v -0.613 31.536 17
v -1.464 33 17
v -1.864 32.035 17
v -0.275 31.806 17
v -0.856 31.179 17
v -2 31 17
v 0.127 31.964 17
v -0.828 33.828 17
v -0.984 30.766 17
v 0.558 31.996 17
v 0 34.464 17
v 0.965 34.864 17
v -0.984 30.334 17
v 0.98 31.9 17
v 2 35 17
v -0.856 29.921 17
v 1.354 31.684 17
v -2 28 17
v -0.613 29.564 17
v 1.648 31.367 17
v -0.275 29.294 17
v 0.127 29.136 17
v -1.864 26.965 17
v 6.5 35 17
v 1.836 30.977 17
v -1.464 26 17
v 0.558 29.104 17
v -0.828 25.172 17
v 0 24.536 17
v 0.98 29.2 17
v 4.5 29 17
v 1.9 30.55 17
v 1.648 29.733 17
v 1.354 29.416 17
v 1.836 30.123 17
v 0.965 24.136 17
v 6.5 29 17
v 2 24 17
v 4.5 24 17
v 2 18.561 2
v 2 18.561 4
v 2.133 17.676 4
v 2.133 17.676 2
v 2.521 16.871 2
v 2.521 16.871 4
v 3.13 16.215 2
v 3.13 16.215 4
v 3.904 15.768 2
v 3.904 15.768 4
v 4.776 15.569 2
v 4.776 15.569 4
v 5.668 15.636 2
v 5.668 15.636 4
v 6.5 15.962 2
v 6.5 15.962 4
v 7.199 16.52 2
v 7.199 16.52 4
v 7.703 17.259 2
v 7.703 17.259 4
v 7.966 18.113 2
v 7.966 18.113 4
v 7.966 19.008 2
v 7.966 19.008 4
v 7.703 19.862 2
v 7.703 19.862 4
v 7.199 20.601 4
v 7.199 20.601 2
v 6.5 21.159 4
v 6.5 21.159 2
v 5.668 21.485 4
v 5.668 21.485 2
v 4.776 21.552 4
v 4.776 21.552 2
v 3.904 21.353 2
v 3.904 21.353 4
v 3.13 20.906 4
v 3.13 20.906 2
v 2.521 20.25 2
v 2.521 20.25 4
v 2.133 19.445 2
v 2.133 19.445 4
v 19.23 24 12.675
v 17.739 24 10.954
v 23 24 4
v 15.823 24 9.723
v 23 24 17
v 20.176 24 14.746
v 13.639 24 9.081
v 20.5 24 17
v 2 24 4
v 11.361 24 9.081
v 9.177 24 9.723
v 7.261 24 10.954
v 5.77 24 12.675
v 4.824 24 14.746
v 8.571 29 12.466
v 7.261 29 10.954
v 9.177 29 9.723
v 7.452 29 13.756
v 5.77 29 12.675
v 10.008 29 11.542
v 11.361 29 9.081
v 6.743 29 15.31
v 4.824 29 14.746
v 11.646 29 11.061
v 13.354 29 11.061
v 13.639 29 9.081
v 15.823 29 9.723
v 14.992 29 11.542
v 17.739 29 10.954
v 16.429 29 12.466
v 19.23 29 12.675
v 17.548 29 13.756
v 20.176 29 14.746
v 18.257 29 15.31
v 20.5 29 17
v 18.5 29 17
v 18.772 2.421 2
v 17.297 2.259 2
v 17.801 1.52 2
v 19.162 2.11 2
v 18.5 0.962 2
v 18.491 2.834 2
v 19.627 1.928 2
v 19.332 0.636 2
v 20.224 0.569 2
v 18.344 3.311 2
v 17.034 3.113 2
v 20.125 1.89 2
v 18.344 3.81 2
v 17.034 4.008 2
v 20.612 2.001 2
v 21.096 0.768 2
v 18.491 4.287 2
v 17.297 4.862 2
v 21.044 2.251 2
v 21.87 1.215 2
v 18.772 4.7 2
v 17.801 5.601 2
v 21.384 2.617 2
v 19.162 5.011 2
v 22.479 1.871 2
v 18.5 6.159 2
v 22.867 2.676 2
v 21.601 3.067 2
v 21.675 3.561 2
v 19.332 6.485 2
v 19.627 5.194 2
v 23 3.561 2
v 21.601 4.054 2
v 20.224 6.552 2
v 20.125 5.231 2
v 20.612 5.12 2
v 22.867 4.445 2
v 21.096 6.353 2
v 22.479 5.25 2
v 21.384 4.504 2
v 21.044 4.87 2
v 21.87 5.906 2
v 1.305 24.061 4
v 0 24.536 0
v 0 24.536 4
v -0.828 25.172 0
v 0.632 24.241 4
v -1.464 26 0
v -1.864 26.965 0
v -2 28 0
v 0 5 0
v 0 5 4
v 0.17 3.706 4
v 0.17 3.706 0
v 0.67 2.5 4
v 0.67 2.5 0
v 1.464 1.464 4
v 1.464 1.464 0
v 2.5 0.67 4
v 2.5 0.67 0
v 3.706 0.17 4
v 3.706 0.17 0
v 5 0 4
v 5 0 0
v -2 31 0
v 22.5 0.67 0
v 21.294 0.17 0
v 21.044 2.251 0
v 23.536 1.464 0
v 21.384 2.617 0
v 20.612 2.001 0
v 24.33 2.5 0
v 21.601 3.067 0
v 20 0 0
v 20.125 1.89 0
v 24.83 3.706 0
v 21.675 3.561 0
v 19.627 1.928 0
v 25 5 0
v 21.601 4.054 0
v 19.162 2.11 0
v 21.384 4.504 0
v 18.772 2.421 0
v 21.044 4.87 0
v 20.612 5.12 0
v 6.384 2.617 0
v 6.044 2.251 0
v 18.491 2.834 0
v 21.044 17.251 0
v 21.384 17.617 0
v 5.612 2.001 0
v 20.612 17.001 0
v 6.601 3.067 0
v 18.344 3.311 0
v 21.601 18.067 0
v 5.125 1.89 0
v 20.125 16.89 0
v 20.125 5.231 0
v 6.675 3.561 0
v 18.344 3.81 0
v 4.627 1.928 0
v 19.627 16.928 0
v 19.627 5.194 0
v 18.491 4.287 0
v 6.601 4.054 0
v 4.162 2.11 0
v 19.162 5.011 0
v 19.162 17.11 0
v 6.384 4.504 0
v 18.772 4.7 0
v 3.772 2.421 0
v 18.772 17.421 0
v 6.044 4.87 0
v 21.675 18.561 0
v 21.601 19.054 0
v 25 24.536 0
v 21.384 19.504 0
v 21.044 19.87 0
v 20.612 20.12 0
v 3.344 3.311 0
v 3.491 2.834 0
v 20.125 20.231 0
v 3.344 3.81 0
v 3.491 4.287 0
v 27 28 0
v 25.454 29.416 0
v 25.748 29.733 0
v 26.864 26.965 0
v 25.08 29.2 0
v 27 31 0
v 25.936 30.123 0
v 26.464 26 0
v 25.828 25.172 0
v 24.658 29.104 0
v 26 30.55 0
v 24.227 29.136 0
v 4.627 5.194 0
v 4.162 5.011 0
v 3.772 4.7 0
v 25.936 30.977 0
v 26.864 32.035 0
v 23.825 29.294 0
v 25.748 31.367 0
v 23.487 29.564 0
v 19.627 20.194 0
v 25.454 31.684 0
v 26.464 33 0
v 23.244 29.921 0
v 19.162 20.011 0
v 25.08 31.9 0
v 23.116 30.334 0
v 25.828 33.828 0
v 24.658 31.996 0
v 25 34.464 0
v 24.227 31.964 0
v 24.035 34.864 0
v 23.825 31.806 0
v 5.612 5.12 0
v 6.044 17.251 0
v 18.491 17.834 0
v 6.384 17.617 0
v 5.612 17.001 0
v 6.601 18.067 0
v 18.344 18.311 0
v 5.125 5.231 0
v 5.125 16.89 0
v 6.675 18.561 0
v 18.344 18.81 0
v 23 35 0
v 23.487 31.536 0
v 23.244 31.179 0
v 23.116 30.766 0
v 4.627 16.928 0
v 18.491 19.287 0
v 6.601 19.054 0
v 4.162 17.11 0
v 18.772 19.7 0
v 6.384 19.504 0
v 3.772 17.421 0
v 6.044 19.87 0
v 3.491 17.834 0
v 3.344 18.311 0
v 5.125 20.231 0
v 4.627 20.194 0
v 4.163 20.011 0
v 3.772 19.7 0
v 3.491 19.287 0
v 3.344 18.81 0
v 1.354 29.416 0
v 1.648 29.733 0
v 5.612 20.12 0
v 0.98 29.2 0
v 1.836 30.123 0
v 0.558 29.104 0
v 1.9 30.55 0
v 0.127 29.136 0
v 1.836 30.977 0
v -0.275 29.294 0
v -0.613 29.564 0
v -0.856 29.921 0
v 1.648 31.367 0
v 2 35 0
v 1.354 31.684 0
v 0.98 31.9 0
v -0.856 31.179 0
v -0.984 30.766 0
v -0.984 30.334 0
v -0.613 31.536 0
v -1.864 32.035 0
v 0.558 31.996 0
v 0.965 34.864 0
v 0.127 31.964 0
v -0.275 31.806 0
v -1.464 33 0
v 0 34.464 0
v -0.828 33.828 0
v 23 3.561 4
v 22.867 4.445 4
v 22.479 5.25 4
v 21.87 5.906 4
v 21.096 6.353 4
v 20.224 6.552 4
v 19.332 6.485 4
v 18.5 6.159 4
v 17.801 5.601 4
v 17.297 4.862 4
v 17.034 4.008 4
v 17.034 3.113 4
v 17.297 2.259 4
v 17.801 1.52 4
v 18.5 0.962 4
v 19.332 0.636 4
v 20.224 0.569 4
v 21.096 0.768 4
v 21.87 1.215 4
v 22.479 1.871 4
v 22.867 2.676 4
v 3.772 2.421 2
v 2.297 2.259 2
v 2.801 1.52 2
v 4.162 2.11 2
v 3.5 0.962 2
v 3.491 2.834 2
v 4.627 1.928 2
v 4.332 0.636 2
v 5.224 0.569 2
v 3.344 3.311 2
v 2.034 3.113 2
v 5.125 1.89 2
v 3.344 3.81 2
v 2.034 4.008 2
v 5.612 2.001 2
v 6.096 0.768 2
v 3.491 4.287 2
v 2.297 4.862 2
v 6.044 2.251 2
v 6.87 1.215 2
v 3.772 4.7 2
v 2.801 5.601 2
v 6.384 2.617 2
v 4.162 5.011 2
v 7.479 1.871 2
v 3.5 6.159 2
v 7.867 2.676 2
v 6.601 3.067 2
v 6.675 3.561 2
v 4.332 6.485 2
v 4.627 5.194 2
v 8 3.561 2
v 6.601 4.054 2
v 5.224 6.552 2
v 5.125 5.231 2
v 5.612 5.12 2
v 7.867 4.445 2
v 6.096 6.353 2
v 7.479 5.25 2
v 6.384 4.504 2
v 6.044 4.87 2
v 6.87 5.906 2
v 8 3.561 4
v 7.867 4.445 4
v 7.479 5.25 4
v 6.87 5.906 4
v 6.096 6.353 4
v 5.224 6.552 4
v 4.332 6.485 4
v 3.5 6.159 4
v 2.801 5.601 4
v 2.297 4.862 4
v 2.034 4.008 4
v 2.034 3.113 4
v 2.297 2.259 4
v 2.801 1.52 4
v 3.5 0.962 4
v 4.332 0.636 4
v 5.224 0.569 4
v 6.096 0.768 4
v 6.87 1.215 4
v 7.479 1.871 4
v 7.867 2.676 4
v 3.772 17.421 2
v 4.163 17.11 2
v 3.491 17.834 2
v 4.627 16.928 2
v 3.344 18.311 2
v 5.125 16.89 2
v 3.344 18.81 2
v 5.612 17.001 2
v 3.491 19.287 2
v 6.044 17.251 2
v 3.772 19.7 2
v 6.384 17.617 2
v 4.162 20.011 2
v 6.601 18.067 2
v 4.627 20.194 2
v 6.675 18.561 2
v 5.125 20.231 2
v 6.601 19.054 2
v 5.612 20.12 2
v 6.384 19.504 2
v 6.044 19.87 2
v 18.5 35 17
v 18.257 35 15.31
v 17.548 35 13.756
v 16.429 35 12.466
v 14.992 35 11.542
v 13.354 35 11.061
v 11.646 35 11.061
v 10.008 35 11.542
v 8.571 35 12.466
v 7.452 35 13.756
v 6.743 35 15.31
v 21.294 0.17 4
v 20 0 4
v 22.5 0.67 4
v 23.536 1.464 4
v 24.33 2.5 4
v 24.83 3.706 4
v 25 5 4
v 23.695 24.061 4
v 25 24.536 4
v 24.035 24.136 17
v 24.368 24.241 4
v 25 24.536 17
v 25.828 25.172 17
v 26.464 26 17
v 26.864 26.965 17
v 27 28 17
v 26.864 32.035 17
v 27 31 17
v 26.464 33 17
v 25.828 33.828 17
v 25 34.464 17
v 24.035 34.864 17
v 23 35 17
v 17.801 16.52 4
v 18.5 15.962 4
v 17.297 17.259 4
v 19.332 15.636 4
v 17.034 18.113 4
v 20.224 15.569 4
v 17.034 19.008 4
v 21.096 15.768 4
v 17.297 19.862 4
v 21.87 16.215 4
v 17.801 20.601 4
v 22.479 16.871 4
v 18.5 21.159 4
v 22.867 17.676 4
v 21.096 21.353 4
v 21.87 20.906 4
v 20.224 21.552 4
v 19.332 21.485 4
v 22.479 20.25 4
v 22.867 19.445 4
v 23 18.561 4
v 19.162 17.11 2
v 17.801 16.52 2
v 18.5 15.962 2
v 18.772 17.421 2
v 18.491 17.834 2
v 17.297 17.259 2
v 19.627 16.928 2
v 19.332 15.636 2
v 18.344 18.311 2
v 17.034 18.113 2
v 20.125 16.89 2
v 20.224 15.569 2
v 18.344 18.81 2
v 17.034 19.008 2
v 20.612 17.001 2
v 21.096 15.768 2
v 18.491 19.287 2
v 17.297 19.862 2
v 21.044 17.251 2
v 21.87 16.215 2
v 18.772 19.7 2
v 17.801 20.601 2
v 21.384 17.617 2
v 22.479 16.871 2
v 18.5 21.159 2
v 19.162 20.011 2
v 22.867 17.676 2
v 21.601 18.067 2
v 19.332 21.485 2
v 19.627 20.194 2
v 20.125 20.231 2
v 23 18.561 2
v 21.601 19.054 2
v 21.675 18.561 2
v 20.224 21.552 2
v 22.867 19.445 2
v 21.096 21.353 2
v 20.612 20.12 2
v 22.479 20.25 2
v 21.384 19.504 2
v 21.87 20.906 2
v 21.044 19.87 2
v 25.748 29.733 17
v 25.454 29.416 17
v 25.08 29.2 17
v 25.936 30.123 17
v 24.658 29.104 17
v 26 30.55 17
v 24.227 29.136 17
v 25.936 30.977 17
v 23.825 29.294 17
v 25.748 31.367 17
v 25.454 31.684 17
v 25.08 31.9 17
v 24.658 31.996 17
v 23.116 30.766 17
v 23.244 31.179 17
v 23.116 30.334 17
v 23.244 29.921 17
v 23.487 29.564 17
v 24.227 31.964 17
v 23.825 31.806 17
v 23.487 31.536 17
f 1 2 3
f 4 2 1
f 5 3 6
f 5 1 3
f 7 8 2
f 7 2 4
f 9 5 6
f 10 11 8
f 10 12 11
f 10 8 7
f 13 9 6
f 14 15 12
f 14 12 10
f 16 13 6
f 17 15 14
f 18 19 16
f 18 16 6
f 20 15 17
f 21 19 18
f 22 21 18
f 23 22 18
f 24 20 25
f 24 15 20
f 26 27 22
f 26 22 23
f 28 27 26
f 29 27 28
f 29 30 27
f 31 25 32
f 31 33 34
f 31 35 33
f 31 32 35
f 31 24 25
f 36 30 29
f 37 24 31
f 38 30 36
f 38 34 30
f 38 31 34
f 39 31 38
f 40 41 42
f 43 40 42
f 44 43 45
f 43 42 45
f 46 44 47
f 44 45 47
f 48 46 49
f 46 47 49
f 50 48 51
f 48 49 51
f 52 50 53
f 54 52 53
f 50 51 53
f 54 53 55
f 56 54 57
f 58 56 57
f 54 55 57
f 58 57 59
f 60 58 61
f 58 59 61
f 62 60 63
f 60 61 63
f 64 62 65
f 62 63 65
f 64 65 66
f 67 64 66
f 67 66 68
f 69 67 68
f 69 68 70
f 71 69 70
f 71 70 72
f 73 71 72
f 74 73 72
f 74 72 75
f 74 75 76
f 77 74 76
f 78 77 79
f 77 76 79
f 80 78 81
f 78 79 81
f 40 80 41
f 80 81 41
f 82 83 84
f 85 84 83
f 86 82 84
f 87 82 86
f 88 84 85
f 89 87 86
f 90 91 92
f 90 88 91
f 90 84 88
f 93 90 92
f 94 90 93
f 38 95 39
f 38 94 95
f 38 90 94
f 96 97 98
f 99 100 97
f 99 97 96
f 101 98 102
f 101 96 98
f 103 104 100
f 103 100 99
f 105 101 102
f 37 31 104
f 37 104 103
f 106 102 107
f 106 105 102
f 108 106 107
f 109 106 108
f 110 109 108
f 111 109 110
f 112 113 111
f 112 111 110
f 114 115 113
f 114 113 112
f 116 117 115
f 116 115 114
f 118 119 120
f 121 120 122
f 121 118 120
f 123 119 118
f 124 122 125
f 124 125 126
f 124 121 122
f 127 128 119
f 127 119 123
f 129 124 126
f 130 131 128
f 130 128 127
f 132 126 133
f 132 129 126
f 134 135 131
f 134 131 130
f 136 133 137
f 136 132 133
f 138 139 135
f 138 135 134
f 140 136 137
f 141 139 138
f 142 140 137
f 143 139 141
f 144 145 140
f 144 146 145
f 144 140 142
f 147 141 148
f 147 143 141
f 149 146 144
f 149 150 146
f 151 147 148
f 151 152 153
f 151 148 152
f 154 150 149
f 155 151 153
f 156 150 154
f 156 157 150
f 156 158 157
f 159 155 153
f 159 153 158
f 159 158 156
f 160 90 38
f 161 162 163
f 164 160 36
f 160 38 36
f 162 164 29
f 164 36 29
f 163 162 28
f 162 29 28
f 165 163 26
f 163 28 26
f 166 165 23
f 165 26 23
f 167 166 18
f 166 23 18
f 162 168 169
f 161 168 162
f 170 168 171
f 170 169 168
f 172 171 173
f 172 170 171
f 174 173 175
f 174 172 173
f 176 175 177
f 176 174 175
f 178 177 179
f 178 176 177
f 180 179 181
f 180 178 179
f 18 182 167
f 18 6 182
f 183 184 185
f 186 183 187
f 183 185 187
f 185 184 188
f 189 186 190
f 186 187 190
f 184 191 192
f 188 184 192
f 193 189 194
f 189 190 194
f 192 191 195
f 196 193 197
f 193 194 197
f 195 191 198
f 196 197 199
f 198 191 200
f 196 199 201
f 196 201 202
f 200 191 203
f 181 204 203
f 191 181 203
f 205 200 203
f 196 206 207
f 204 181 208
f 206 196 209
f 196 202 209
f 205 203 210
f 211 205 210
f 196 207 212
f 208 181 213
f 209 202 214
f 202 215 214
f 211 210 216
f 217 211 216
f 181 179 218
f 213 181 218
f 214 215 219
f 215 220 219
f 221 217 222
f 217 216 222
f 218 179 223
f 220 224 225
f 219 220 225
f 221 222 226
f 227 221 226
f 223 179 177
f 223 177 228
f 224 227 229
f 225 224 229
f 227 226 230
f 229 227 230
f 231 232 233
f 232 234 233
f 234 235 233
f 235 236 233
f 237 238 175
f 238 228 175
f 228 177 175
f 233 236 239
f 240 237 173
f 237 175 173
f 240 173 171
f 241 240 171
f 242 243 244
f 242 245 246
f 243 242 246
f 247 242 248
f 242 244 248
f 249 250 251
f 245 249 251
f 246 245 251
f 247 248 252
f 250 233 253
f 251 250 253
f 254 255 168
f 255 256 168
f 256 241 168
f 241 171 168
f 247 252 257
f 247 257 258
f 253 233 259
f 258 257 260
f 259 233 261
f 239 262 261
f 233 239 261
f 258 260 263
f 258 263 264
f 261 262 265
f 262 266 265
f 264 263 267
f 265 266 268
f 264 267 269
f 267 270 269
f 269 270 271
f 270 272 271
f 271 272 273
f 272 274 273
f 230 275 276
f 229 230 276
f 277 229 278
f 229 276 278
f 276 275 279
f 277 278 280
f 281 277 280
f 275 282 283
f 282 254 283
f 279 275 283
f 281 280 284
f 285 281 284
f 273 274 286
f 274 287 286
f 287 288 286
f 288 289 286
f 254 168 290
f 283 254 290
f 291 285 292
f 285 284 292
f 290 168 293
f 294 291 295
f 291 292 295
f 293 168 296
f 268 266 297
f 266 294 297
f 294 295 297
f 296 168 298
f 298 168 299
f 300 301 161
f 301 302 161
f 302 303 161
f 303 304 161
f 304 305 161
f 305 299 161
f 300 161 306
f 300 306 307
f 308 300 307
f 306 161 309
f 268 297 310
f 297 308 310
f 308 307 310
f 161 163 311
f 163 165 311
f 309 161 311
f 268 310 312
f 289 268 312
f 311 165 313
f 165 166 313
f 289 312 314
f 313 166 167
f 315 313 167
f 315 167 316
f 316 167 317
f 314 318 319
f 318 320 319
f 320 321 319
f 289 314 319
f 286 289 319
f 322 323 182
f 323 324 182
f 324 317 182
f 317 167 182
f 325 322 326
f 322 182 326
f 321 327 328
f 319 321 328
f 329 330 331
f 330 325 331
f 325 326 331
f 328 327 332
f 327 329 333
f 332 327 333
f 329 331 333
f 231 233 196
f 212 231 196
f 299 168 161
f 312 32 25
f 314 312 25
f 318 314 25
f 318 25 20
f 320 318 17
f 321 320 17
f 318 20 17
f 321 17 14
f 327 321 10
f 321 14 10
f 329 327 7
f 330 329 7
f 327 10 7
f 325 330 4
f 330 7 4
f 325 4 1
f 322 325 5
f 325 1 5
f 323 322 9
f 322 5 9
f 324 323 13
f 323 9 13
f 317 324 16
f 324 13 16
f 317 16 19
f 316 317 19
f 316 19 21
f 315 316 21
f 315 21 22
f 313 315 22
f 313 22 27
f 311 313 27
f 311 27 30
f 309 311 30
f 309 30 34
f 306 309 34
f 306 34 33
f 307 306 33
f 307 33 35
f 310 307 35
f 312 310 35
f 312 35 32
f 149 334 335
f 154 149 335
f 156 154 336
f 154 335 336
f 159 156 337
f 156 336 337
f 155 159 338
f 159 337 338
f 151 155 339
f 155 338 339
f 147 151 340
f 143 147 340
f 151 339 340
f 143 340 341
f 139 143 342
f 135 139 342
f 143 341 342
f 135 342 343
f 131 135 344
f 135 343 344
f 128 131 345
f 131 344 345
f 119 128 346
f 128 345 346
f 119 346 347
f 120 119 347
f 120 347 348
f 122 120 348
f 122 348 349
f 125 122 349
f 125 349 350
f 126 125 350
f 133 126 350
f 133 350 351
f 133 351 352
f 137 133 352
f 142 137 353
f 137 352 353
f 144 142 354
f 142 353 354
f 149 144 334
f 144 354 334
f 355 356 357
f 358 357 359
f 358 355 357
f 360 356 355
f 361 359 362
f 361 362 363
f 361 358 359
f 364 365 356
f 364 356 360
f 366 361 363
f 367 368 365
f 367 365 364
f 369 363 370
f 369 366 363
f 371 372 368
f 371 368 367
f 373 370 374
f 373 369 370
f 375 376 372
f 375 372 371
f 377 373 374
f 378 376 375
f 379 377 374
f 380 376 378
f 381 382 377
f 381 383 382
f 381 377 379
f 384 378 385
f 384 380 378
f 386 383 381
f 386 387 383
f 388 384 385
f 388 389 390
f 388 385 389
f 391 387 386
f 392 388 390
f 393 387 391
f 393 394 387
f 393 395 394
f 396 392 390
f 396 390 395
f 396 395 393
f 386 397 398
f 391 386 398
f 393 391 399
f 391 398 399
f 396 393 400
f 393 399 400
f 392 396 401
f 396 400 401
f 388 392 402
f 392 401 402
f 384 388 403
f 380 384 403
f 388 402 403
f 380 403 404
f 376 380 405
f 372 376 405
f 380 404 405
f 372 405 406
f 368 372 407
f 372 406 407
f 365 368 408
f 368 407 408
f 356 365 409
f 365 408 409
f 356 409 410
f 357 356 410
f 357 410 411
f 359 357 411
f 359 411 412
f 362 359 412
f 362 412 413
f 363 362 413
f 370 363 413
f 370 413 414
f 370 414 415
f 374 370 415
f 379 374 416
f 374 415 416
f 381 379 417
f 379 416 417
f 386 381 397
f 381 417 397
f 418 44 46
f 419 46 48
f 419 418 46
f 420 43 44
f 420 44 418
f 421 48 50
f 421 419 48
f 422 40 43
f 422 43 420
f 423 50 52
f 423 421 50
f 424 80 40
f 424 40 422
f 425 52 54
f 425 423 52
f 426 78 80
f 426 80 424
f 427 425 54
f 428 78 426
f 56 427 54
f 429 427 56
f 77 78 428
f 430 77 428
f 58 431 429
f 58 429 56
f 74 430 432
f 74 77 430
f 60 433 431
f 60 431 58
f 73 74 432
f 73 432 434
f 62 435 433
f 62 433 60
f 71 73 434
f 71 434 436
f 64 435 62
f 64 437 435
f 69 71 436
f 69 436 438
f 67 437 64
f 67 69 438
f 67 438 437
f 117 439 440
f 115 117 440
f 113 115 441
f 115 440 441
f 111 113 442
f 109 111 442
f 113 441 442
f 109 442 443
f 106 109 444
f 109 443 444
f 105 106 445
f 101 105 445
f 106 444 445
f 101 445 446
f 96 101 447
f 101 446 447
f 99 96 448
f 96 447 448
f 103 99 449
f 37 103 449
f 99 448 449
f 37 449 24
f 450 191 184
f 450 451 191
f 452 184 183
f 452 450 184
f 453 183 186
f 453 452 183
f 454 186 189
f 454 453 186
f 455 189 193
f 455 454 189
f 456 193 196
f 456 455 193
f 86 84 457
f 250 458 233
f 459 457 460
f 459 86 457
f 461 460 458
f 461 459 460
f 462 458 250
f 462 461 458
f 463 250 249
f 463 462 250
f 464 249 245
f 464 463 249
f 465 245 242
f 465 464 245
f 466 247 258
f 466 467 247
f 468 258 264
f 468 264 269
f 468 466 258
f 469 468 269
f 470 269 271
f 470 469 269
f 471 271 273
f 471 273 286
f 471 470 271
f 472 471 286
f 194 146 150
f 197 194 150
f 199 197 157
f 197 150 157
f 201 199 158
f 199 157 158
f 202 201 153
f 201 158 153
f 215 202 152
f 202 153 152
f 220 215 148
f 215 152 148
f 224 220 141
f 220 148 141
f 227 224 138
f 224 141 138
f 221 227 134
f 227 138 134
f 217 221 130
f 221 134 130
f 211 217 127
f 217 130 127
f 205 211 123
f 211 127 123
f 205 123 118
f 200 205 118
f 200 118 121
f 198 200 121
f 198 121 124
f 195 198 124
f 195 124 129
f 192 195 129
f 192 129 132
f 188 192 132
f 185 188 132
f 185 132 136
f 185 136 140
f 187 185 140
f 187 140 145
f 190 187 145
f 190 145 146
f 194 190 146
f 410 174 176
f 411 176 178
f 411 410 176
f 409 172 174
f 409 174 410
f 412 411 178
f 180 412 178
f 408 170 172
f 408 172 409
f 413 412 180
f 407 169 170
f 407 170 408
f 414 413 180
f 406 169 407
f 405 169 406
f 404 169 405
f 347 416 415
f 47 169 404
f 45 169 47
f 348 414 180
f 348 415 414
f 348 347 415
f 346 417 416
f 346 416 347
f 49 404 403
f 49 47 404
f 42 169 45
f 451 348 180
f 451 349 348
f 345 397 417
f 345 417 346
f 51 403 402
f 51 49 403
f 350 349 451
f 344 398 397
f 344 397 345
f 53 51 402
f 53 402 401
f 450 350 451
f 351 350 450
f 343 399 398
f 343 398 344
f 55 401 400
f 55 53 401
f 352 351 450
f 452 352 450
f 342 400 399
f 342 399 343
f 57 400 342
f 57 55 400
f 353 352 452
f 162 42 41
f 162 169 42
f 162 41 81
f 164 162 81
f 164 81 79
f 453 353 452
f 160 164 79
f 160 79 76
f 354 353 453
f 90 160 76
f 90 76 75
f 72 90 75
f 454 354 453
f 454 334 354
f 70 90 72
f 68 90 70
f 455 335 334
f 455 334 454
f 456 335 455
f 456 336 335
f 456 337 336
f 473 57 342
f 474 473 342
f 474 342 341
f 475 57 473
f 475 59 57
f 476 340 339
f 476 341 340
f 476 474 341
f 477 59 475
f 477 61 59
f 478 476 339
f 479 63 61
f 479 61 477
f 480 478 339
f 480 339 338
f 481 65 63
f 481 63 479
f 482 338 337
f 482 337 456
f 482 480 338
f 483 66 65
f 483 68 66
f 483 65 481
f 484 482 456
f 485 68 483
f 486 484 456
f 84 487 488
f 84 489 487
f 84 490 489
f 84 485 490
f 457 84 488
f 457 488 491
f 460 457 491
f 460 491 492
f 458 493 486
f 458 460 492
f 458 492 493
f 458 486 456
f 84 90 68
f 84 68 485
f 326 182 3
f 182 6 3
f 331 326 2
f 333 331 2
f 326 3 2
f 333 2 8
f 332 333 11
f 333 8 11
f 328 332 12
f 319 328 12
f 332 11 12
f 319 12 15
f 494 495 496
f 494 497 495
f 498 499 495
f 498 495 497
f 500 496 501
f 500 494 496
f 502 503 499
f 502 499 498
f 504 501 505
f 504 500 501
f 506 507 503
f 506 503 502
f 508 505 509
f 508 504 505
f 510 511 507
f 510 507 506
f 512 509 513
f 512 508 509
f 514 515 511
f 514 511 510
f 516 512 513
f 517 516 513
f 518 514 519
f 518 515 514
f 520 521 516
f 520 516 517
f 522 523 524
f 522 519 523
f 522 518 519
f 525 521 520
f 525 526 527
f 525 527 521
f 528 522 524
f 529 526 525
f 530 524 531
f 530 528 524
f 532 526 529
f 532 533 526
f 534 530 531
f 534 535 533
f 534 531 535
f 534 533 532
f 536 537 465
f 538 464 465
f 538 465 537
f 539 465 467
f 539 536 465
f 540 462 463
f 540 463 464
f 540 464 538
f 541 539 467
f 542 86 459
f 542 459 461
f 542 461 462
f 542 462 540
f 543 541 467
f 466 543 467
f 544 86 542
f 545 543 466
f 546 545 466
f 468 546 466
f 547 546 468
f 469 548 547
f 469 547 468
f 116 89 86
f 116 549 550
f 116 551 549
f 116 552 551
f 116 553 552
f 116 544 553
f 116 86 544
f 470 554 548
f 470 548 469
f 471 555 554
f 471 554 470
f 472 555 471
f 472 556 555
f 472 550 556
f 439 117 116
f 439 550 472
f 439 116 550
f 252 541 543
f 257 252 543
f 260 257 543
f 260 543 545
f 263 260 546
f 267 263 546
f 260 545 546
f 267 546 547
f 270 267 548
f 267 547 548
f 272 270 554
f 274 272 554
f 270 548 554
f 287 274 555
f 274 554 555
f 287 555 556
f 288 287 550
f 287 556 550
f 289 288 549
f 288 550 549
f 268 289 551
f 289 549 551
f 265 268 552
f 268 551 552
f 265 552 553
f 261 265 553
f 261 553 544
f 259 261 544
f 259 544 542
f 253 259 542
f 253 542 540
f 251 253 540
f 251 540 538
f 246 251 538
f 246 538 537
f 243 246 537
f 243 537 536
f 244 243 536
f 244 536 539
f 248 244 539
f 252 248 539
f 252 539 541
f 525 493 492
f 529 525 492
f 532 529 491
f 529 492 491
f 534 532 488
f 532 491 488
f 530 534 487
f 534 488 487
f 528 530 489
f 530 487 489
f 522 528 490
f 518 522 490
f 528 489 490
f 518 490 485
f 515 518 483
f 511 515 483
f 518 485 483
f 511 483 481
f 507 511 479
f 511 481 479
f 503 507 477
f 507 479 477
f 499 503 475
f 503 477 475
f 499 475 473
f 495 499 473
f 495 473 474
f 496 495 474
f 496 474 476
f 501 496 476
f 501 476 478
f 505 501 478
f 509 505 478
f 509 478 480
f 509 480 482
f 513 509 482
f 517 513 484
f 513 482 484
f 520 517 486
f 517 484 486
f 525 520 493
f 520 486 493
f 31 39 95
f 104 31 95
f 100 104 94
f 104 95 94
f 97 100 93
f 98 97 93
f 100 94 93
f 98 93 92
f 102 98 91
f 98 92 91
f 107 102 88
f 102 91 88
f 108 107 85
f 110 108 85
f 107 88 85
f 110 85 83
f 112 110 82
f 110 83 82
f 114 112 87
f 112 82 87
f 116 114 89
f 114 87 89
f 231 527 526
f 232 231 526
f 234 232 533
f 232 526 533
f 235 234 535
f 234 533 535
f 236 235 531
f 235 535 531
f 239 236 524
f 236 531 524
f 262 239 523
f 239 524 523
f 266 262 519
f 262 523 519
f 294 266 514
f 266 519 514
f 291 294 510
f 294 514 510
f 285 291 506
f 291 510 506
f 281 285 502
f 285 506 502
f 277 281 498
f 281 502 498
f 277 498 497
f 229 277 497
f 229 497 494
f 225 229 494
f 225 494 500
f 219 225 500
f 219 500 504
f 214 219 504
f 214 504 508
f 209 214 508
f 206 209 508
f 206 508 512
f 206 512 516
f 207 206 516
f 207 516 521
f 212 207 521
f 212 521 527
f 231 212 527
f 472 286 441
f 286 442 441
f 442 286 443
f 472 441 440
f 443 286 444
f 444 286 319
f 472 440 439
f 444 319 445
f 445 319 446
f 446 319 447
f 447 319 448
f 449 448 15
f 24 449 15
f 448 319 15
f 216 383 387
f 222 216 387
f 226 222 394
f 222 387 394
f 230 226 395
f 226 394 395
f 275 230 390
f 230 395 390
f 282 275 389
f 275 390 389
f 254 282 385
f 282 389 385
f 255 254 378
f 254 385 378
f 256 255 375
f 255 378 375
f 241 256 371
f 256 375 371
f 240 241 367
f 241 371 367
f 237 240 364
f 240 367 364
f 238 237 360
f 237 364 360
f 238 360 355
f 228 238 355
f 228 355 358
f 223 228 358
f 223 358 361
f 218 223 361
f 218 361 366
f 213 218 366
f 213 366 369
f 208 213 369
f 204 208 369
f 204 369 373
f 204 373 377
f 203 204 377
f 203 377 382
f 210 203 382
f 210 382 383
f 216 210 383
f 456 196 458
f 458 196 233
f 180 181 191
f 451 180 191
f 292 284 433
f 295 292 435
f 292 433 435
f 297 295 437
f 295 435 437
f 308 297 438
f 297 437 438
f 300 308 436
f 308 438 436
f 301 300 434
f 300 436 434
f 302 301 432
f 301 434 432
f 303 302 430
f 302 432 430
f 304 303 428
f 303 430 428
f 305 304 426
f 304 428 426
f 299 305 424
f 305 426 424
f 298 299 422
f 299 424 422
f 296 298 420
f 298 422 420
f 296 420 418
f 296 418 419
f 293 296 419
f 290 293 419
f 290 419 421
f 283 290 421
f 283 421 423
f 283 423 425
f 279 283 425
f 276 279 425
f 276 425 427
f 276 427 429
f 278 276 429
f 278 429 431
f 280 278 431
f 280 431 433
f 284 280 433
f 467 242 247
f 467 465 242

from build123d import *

# Parameters (mm, degrees)
F0_W      = 25
F0_H      = 35
F1_DEPTH  = 4
F2_R      = 1.675
F3_DEPTH  = 25
F4_W      = 25
F4_H      = 11
F5_DEPTH  = 13
F7_DEPTH  = 6
F8_R      = 8
F9_DEPTH  = 5
F2_R_2    = 3
F10_DEPTH = 2
F11_R     = 5
F12_W     = 11
F12_H     = 17
F13_DEPTH = 2
F14_W     = 11
F14_H     = 17
F15_DEPTH = 2
F16_R     = 1.45
F17_DEPTH = 25
F18_R     = 4


with BuildPart() as f1:
    # F0 (on Top) → F1 (new body)
    with BuildSketch(Plane.XY):
        with Locations((12.5, 17.5)):
            Rectangle(F0_W, F0_H)
    extrude(amount=F1_DEPTH)

    # F2 (on face) → F3 (cut)
    with BuildSketch(Plane.XY.offset(4)):
        with BuildLine():
            ThreePointArc((3.325, 18.5605346784), (5, 16.8855346784), (6.675, 18.5605346784))
            ThreePointArc((6.675, 18.5605346784), (5, 20.2355346784), (3.325, 18.5605346784))
        make_face()
        with Locations((20, 18.5605346784)):
            Circle(F2_R)
        with Locations((20, 3.5605346784)):
            Circle(F2_R)
        with Locations((5, 3.5605346784)):
            Circle(F2_R)
    extrude(amount=-F3_DEPTH, mode=Mode.SUBTRACT)

    # F4 (on face) → F5 (join)
    with BuildSketch(Plane.XY.offset(4)):
        with Locations((12.5, 29.5)):
            Rectangle(F4_W, F4_H)
    extrude(amount=F5_DEPTH)

    # F6 (on face) → F7 (cut)
    with BuildSketch(Plane(origin=(0, 35, 0), x_dir=(-1, 0, 0), z_dir=(0, 1, 0))):
        with BuildLine():
            ThreePointArc((-18.5, 17), (-12.5, 11), (-6.5, 17))
            Line((-6.5, 17), (-18.5, 17))
        make_face()
    extrude(amount=-F7_DEPTH, mode=Mode.SUBTRACT)

    # F8 (on face) → F9 (cut)
    with BuildSketch(Plane.XZ.offset(-24)):
        with Locations((12.5, 17)):
            Circle(F8_R)
    extrude(amount=-F9_DEPTH, mode=Mode.SUBTRACT)

    # F2 (on face) → F10 (cut)
    with BuildSketch(Plane.XY.offset(4)):
        with BuildLine():
            ThreePointArc((8, 18.5605346784), (5, 21.5605346784), (2, 18.5605346784))
            ThreePointArc((2, 18.5605346784), (5, 15.5605346784), (8, 18.5605346784))
        make_face()
        with BuildLine():
            ThreePointArc((3.325, 18.5605346784), (5, 20.2355346784), (6.675, 18.5605346784))
            ThreePointArc((6.675, 18.5605346784), (5, 16.8855346784), (3.325, 18.5605346784))
        make_face(mode=Mode.SUBTRACT)
        with Locations((20, 18.5605346784)):
            Circle(F2_R_2)
        with Locations((20, 18.5605346784)):
            Circle(F2_R, mode=Mode.SUBTRACT)
        with Locations((20, 3.5605346784)):
            Circle(F2_R_2)
        with Locations((20, 3.5605346784)):
            Circle(F2_R, mode=Mode.SUBTRACT)
        with Locations((5, 3.5605346784)):
            Circle(F2_R_2)
        with Locations((5, 3.5605346784)):
            Circle(F2_R, mode=Mode.SUBTRACT)
    extrude(amount=-F10_DEPTH, mode=Mode.SUBTRACT)

    # F11
    f11_edges = [f1.edges().sort_by_distance(p)[0] for p in [
        (0, 0, 2),
        (25, 0, 2),
    ]]
    fillet(f11_edges, radius=F11_R)

    # F12 (on face) → F13 (join)
    with BuildSketch(Plane(origin=(0, 0, 0), x_dir=(0, -1, 0), z_dir=(-1, 0, 0))):
        with Locations((-29.5, 8.5)):
            Rectangle(F12_W, F12_H)
    extrude(amount=F13_DEPTH)

    # F14 (on face) → F15 (join)
    with BuildSketch(Plane.YZ.offset(25)):
        with Locations((29.5, 8.5)):
            Rectangle(F14_W, F14_H)
    extrude(amount=F15_DEPTH)

    # F16 (on face) → F17 (cut)
    with BuildSketch(Plane.XY.offset(17)):
        with Locations((0.45, 30.55)):
            Circle(F16_R)
        with Locations((24.55, 30.55)):
            Circle(F16_R)
    extrude(amount=-F17_DEPTH, mode=Mode.SUBTRACT)

    # F18
    f18_edges = [f1.edges().sort_by_distance(p)[0] for p in [
        (-2, 24, 8.5),
        (-2, 35, 8.5),
        (27, 35, 8.5),
        (27, 24, 8.5),
    ]]
    fillet(f18_edges, radius=F18_R)


solid = f1.part
